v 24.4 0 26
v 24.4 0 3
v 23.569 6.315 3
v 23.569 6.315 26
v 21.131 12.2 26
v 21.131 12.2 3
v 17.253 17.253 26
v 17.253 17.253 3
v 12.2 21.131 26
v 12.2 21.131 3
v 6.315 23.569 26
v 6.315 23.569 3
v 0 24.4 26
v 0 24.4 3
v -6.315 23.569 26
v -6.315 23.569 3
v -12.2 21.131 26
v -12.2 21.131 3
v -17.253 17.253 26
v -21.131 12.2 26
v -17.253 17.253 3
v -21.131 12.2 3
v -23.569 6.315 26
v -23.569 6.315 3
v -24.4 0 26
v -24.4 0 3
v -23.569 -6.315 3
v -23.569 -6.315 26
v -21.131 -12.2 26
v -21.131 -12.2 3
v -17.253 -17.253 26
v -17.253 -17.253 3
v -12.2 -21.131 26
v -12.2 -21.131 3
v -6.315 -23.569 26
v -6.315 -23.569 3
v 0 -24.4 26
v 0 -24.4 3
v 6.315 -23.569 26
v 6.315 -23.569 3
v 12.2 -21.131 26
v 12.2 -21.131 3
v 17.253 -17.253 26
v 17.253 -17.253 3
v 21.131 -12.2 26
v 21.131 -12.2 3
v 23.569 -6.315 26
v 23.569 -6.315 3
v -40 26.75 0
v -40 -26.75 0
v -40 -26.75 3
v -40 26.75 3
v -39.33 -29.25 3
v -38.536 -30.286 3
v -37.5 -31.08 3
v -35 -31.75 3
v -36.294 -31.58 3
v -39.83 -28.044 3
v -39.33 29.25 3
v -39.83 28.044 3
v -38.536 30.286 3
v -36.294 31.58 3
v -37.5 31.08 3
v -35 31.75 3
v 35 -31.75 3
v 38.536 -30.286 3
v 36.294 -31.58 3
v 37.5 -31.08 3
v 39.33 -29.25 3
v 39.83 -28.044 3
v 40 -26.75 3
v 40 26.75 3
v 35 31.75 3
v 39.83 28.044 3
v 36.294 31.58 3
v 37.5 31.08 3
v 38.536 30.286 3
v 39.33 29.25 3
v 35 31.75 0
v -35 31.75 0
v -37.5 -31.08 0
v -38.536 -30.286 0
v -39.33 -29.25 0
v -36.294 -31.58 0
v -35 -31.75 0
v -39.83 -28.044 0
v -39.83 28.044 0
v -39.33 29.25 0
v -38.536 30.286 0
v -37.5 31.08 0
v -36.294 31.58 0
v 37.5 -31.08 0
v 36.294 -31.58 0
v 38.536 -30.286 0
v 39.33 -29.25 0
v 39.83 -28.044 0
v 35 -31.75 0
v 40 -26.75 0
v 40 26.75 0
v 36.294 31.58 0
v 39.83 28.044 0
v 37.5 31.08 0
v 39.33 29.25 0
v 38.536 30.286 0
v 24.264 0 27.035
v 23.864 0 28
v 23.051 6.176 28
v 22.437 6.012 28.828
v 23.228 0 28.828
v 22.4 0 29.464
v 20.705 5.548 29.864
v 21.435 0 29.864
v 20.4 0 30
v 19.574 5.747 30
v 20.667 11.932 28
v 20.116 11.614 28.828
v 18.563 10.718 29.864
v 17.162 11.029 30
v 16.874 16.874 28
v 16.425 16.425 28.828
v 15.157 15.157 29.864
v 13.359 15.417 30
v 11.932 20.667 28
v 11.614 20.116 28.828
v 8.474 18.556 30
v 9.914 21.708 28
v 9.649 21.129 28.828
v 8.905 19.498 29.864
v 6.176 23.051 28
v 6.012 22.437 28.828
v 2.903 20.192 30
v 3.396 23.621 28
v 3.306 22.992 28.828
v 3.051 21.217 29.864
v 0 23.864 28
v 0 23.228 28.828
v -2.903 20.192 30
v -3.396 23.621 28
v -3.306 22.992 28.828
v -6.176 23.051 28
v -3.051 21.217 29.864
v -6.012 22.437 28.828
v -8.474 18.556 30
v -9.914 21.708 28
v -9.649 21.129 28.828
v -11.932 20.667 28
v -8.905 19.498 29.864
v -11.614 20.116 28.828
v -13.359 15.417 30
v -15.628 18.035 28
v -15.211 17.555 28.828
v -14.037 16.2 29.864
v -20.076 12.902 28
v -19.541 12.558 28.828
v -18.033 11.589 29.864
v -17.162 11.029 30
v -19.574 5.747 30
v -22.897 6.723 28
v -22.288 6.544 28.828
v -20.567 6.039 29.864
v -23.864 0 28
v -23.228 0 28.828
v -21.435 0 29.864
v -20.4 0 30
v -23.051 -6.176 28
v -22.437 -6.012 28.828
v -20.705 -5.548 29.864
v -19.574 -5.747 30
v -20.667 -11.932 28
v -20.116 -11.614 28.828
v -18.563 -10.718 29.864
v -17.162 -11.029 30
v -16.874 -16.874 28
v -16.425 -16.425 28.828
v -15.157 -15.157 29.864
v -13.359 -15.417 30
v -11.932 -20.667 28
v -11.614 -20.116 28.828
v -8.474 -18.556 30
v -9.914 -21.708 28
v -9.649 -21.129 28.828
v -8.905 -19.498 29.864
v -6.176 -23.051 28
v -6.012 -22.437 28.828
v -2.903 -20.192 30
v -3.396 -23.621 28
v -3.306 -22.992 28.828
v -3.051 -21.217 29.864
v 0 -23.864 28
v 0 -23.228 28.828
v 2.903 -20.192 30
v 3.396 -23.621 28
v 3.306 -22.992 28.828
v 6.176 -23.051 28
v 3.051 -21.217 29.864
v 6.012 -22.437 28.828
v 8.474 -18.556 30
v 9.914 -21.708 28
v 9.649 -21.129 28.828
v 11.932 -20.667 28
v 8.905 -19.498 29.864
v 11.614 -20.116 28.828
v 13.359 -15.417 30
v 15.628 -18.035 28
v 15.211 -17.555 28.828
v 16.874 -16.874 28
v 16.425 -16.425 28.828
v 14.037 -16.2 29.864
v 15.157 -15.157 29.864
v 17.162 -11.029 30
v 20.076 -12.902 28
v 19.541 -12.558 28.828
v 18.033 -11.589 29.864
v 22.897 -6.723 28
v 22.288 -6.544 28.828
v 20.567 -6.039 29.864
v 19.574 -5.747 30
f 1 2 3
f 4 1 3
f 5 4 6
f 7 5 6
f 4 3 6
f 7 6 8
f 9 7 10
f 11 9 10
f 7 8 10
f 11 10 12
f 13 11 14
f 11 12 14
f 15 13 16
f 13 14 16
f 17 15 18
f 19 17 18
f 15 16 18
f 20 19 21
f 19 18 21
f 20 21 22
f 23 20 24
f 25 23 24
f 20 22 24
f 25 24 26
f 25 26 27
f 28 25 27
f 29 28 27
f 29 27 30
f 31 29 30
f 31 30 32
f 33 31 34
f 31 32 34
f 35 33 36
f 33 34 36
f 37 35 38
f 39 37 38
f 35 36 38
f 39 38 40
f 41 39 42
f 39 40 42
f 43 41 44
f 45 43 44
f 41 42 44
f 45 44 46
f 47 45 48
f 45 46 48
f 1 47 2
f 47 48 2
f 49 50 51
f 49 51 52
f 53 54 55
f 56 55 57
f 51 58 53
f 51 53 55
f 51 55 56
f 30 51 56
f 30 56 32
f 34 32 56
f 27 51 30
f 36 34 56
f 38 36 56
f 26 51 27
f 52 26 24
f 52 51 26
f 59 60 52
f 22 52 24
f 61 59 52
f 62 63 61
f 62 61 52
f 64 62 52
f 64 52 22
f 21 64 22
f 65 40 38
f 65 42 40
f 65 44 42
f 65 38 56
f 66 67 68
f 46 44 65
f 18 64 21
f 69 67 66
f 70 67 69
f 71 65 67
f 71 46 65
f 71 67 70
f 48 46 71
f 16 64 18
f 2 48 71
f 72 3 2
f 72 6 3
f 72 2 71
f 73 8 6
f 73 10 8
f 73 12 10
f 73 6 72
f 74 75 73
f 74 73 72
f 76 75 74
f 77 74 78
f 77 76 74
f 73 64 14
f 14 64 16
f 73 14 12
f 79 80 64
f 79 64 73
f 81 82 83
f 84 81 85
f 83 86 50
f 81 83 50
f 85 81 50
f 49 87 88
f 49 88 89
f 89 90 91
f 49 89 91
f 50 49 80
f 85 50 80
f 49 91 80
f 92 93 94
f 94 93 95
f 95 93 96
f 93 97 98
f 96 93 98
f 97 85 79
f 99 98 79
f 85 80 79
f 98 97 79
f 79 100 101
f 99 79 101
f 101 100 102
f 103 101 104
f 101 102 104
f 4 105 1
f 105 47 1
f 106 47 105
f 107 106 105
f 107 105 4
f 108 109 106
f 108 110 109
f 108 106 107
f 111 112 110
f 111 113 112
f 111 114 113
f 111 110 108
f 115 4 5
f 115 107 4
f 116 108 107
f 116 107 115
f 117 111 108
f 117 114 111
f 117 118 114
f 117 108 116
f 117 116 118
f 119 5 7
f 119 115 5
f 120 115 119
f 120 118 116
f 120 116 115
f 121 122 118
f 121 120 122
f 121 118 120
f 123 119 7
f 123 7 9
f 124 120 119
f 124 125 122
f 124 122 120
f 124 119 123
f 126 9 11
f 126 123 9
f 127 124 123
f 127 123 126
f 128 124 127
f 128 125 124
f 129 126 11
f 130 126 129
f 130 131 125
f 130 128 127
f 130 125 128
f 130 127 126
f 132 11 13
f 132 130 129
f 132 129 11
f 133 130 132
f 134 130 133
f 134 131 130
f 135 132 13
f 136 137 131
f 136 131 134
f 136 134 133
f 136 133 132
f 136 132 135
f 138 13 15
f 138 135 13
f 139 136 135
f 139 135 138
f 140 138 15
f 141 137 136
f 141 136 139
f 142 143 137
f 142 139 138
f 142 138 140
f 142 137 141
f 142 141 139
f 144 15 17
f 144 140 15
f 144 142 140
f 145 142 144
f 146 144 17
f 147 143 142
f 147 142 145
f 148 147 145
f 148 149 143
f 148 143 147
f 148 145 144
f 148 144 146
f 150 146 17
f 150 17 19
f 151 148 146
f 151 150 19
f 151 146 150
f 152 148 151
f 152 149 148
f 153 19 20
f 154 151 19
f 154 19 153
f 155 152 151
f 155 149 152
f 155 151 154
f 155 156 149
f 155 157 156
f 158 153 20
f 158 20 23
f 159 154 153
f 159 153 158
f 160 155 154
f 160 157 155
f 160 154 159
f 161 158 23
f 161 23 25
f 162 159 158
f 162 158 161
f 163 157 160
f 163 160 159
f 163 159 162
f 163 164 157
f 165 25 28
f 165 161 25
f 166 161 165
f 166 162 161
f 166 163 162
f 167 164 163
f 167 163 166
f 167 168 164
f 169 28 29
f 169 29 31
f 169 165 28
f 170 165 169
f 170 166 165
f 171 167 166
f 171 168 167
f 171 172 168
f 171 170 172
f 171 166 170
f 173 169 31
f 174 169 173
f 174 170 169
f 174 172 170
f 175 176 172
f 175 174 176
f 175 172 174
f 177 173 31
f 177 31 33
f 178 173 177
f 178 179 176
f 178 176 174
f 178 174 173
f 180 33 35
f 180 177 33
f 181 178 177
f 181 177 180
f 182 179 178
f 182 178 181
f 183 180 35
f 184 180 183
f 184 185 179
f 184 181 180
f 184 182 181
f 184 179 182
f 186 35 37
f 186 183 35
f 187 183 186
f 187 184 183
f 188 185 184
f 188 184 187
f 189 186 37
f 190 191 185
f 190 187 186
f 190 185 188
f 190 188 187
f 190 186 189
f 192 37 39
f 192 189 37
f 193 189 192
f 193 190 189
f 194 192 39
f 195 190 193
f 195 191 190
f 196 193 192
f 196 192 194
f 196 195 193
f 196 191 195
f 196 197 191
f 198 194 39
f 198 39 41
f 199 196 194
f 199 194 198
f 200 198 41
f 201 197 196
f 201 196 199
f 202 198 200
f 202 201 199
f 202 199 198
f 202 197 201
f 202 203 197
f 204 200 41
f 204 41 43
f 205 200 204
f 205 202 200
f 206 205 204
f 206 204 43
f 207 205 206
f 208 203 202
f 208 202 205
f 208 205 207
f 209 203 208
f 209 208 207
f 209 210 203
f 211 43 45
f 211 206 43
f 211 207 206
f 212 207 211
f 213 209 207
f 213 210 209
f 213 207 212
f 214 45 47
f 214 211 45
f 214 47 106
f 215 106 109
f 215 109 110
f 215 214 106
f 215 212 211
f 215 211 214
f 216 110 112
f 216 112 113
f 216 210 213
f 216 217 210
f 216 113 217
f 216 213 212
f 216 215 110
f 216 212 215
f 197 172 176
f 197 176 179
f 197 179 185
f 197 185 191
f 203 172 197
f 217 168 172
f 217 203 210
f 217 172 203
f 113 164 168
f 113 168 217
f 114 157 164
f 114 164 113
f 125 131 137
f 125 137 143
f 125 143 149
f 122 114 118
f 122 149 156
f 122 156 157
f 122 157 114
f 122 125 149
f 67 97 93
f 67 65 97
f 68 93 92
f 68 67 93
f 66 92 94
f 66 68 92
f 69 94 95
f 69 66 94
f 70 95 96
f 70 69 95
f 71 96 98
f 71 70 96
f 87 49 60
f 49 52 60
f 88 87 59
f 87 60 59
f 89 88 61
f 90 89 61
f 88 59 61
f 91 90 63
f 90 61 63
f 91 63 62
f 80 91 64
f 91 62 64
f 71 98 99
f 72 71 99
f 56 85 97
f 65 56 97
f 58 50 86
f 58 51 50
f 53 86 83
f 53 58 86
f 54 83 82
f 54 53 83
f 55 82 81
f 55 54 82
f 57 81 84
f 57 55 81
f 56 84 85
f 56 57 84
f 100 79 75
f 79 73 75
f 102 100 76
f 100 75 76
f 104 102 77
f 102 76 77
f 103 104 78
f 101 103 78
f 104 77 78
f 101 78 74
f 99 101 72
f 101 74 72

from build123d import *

# Parameters (mm, degrees)
SKETCH_W     = 80
SKETCH_H     = 63.5
PAD_DEPTH    = 3
SKETCH001_R  = 24.4
PAD001_DEPTH = 27
FILLET_R     = 4
FILLET001_R  = 5


with BuildPart() as part:
    # Sketch → Pad (new body)
    with BuildSketch(Plane.XY):
        Rectangle(SKETCH_W, SKETCH_H)
    extrude(amount=PAD_DEPTH)

    # Sketch001 (on Face6 of Pad) → Pad001 (join)
    with BuildSketch(Plane.XY.offset(3)):
        Circle(SKETCH001_R)
    extrude(amount=PAD001_DEPTH)

    # Fillet
    fillet_edges = [part.edges().sort_by_distance(p)[0] for p in [
        (-24.4, 0, 30),
    ]]
    fillet(fillet_edges, radius=FILLET_R)

    # Fillet001
    fillet001_edges = [part.edges().sort_by_distance(p)[0] for p in [
        (40, -31.75, 1.5),
        (40, 31.75, 1.5),
        (-40, 31.75, 1.5),
        (-40, -31.75, 1.5),
    ]]
    fillet(fillet001_edges, radius=FILLET001_R)


solid = part.part
